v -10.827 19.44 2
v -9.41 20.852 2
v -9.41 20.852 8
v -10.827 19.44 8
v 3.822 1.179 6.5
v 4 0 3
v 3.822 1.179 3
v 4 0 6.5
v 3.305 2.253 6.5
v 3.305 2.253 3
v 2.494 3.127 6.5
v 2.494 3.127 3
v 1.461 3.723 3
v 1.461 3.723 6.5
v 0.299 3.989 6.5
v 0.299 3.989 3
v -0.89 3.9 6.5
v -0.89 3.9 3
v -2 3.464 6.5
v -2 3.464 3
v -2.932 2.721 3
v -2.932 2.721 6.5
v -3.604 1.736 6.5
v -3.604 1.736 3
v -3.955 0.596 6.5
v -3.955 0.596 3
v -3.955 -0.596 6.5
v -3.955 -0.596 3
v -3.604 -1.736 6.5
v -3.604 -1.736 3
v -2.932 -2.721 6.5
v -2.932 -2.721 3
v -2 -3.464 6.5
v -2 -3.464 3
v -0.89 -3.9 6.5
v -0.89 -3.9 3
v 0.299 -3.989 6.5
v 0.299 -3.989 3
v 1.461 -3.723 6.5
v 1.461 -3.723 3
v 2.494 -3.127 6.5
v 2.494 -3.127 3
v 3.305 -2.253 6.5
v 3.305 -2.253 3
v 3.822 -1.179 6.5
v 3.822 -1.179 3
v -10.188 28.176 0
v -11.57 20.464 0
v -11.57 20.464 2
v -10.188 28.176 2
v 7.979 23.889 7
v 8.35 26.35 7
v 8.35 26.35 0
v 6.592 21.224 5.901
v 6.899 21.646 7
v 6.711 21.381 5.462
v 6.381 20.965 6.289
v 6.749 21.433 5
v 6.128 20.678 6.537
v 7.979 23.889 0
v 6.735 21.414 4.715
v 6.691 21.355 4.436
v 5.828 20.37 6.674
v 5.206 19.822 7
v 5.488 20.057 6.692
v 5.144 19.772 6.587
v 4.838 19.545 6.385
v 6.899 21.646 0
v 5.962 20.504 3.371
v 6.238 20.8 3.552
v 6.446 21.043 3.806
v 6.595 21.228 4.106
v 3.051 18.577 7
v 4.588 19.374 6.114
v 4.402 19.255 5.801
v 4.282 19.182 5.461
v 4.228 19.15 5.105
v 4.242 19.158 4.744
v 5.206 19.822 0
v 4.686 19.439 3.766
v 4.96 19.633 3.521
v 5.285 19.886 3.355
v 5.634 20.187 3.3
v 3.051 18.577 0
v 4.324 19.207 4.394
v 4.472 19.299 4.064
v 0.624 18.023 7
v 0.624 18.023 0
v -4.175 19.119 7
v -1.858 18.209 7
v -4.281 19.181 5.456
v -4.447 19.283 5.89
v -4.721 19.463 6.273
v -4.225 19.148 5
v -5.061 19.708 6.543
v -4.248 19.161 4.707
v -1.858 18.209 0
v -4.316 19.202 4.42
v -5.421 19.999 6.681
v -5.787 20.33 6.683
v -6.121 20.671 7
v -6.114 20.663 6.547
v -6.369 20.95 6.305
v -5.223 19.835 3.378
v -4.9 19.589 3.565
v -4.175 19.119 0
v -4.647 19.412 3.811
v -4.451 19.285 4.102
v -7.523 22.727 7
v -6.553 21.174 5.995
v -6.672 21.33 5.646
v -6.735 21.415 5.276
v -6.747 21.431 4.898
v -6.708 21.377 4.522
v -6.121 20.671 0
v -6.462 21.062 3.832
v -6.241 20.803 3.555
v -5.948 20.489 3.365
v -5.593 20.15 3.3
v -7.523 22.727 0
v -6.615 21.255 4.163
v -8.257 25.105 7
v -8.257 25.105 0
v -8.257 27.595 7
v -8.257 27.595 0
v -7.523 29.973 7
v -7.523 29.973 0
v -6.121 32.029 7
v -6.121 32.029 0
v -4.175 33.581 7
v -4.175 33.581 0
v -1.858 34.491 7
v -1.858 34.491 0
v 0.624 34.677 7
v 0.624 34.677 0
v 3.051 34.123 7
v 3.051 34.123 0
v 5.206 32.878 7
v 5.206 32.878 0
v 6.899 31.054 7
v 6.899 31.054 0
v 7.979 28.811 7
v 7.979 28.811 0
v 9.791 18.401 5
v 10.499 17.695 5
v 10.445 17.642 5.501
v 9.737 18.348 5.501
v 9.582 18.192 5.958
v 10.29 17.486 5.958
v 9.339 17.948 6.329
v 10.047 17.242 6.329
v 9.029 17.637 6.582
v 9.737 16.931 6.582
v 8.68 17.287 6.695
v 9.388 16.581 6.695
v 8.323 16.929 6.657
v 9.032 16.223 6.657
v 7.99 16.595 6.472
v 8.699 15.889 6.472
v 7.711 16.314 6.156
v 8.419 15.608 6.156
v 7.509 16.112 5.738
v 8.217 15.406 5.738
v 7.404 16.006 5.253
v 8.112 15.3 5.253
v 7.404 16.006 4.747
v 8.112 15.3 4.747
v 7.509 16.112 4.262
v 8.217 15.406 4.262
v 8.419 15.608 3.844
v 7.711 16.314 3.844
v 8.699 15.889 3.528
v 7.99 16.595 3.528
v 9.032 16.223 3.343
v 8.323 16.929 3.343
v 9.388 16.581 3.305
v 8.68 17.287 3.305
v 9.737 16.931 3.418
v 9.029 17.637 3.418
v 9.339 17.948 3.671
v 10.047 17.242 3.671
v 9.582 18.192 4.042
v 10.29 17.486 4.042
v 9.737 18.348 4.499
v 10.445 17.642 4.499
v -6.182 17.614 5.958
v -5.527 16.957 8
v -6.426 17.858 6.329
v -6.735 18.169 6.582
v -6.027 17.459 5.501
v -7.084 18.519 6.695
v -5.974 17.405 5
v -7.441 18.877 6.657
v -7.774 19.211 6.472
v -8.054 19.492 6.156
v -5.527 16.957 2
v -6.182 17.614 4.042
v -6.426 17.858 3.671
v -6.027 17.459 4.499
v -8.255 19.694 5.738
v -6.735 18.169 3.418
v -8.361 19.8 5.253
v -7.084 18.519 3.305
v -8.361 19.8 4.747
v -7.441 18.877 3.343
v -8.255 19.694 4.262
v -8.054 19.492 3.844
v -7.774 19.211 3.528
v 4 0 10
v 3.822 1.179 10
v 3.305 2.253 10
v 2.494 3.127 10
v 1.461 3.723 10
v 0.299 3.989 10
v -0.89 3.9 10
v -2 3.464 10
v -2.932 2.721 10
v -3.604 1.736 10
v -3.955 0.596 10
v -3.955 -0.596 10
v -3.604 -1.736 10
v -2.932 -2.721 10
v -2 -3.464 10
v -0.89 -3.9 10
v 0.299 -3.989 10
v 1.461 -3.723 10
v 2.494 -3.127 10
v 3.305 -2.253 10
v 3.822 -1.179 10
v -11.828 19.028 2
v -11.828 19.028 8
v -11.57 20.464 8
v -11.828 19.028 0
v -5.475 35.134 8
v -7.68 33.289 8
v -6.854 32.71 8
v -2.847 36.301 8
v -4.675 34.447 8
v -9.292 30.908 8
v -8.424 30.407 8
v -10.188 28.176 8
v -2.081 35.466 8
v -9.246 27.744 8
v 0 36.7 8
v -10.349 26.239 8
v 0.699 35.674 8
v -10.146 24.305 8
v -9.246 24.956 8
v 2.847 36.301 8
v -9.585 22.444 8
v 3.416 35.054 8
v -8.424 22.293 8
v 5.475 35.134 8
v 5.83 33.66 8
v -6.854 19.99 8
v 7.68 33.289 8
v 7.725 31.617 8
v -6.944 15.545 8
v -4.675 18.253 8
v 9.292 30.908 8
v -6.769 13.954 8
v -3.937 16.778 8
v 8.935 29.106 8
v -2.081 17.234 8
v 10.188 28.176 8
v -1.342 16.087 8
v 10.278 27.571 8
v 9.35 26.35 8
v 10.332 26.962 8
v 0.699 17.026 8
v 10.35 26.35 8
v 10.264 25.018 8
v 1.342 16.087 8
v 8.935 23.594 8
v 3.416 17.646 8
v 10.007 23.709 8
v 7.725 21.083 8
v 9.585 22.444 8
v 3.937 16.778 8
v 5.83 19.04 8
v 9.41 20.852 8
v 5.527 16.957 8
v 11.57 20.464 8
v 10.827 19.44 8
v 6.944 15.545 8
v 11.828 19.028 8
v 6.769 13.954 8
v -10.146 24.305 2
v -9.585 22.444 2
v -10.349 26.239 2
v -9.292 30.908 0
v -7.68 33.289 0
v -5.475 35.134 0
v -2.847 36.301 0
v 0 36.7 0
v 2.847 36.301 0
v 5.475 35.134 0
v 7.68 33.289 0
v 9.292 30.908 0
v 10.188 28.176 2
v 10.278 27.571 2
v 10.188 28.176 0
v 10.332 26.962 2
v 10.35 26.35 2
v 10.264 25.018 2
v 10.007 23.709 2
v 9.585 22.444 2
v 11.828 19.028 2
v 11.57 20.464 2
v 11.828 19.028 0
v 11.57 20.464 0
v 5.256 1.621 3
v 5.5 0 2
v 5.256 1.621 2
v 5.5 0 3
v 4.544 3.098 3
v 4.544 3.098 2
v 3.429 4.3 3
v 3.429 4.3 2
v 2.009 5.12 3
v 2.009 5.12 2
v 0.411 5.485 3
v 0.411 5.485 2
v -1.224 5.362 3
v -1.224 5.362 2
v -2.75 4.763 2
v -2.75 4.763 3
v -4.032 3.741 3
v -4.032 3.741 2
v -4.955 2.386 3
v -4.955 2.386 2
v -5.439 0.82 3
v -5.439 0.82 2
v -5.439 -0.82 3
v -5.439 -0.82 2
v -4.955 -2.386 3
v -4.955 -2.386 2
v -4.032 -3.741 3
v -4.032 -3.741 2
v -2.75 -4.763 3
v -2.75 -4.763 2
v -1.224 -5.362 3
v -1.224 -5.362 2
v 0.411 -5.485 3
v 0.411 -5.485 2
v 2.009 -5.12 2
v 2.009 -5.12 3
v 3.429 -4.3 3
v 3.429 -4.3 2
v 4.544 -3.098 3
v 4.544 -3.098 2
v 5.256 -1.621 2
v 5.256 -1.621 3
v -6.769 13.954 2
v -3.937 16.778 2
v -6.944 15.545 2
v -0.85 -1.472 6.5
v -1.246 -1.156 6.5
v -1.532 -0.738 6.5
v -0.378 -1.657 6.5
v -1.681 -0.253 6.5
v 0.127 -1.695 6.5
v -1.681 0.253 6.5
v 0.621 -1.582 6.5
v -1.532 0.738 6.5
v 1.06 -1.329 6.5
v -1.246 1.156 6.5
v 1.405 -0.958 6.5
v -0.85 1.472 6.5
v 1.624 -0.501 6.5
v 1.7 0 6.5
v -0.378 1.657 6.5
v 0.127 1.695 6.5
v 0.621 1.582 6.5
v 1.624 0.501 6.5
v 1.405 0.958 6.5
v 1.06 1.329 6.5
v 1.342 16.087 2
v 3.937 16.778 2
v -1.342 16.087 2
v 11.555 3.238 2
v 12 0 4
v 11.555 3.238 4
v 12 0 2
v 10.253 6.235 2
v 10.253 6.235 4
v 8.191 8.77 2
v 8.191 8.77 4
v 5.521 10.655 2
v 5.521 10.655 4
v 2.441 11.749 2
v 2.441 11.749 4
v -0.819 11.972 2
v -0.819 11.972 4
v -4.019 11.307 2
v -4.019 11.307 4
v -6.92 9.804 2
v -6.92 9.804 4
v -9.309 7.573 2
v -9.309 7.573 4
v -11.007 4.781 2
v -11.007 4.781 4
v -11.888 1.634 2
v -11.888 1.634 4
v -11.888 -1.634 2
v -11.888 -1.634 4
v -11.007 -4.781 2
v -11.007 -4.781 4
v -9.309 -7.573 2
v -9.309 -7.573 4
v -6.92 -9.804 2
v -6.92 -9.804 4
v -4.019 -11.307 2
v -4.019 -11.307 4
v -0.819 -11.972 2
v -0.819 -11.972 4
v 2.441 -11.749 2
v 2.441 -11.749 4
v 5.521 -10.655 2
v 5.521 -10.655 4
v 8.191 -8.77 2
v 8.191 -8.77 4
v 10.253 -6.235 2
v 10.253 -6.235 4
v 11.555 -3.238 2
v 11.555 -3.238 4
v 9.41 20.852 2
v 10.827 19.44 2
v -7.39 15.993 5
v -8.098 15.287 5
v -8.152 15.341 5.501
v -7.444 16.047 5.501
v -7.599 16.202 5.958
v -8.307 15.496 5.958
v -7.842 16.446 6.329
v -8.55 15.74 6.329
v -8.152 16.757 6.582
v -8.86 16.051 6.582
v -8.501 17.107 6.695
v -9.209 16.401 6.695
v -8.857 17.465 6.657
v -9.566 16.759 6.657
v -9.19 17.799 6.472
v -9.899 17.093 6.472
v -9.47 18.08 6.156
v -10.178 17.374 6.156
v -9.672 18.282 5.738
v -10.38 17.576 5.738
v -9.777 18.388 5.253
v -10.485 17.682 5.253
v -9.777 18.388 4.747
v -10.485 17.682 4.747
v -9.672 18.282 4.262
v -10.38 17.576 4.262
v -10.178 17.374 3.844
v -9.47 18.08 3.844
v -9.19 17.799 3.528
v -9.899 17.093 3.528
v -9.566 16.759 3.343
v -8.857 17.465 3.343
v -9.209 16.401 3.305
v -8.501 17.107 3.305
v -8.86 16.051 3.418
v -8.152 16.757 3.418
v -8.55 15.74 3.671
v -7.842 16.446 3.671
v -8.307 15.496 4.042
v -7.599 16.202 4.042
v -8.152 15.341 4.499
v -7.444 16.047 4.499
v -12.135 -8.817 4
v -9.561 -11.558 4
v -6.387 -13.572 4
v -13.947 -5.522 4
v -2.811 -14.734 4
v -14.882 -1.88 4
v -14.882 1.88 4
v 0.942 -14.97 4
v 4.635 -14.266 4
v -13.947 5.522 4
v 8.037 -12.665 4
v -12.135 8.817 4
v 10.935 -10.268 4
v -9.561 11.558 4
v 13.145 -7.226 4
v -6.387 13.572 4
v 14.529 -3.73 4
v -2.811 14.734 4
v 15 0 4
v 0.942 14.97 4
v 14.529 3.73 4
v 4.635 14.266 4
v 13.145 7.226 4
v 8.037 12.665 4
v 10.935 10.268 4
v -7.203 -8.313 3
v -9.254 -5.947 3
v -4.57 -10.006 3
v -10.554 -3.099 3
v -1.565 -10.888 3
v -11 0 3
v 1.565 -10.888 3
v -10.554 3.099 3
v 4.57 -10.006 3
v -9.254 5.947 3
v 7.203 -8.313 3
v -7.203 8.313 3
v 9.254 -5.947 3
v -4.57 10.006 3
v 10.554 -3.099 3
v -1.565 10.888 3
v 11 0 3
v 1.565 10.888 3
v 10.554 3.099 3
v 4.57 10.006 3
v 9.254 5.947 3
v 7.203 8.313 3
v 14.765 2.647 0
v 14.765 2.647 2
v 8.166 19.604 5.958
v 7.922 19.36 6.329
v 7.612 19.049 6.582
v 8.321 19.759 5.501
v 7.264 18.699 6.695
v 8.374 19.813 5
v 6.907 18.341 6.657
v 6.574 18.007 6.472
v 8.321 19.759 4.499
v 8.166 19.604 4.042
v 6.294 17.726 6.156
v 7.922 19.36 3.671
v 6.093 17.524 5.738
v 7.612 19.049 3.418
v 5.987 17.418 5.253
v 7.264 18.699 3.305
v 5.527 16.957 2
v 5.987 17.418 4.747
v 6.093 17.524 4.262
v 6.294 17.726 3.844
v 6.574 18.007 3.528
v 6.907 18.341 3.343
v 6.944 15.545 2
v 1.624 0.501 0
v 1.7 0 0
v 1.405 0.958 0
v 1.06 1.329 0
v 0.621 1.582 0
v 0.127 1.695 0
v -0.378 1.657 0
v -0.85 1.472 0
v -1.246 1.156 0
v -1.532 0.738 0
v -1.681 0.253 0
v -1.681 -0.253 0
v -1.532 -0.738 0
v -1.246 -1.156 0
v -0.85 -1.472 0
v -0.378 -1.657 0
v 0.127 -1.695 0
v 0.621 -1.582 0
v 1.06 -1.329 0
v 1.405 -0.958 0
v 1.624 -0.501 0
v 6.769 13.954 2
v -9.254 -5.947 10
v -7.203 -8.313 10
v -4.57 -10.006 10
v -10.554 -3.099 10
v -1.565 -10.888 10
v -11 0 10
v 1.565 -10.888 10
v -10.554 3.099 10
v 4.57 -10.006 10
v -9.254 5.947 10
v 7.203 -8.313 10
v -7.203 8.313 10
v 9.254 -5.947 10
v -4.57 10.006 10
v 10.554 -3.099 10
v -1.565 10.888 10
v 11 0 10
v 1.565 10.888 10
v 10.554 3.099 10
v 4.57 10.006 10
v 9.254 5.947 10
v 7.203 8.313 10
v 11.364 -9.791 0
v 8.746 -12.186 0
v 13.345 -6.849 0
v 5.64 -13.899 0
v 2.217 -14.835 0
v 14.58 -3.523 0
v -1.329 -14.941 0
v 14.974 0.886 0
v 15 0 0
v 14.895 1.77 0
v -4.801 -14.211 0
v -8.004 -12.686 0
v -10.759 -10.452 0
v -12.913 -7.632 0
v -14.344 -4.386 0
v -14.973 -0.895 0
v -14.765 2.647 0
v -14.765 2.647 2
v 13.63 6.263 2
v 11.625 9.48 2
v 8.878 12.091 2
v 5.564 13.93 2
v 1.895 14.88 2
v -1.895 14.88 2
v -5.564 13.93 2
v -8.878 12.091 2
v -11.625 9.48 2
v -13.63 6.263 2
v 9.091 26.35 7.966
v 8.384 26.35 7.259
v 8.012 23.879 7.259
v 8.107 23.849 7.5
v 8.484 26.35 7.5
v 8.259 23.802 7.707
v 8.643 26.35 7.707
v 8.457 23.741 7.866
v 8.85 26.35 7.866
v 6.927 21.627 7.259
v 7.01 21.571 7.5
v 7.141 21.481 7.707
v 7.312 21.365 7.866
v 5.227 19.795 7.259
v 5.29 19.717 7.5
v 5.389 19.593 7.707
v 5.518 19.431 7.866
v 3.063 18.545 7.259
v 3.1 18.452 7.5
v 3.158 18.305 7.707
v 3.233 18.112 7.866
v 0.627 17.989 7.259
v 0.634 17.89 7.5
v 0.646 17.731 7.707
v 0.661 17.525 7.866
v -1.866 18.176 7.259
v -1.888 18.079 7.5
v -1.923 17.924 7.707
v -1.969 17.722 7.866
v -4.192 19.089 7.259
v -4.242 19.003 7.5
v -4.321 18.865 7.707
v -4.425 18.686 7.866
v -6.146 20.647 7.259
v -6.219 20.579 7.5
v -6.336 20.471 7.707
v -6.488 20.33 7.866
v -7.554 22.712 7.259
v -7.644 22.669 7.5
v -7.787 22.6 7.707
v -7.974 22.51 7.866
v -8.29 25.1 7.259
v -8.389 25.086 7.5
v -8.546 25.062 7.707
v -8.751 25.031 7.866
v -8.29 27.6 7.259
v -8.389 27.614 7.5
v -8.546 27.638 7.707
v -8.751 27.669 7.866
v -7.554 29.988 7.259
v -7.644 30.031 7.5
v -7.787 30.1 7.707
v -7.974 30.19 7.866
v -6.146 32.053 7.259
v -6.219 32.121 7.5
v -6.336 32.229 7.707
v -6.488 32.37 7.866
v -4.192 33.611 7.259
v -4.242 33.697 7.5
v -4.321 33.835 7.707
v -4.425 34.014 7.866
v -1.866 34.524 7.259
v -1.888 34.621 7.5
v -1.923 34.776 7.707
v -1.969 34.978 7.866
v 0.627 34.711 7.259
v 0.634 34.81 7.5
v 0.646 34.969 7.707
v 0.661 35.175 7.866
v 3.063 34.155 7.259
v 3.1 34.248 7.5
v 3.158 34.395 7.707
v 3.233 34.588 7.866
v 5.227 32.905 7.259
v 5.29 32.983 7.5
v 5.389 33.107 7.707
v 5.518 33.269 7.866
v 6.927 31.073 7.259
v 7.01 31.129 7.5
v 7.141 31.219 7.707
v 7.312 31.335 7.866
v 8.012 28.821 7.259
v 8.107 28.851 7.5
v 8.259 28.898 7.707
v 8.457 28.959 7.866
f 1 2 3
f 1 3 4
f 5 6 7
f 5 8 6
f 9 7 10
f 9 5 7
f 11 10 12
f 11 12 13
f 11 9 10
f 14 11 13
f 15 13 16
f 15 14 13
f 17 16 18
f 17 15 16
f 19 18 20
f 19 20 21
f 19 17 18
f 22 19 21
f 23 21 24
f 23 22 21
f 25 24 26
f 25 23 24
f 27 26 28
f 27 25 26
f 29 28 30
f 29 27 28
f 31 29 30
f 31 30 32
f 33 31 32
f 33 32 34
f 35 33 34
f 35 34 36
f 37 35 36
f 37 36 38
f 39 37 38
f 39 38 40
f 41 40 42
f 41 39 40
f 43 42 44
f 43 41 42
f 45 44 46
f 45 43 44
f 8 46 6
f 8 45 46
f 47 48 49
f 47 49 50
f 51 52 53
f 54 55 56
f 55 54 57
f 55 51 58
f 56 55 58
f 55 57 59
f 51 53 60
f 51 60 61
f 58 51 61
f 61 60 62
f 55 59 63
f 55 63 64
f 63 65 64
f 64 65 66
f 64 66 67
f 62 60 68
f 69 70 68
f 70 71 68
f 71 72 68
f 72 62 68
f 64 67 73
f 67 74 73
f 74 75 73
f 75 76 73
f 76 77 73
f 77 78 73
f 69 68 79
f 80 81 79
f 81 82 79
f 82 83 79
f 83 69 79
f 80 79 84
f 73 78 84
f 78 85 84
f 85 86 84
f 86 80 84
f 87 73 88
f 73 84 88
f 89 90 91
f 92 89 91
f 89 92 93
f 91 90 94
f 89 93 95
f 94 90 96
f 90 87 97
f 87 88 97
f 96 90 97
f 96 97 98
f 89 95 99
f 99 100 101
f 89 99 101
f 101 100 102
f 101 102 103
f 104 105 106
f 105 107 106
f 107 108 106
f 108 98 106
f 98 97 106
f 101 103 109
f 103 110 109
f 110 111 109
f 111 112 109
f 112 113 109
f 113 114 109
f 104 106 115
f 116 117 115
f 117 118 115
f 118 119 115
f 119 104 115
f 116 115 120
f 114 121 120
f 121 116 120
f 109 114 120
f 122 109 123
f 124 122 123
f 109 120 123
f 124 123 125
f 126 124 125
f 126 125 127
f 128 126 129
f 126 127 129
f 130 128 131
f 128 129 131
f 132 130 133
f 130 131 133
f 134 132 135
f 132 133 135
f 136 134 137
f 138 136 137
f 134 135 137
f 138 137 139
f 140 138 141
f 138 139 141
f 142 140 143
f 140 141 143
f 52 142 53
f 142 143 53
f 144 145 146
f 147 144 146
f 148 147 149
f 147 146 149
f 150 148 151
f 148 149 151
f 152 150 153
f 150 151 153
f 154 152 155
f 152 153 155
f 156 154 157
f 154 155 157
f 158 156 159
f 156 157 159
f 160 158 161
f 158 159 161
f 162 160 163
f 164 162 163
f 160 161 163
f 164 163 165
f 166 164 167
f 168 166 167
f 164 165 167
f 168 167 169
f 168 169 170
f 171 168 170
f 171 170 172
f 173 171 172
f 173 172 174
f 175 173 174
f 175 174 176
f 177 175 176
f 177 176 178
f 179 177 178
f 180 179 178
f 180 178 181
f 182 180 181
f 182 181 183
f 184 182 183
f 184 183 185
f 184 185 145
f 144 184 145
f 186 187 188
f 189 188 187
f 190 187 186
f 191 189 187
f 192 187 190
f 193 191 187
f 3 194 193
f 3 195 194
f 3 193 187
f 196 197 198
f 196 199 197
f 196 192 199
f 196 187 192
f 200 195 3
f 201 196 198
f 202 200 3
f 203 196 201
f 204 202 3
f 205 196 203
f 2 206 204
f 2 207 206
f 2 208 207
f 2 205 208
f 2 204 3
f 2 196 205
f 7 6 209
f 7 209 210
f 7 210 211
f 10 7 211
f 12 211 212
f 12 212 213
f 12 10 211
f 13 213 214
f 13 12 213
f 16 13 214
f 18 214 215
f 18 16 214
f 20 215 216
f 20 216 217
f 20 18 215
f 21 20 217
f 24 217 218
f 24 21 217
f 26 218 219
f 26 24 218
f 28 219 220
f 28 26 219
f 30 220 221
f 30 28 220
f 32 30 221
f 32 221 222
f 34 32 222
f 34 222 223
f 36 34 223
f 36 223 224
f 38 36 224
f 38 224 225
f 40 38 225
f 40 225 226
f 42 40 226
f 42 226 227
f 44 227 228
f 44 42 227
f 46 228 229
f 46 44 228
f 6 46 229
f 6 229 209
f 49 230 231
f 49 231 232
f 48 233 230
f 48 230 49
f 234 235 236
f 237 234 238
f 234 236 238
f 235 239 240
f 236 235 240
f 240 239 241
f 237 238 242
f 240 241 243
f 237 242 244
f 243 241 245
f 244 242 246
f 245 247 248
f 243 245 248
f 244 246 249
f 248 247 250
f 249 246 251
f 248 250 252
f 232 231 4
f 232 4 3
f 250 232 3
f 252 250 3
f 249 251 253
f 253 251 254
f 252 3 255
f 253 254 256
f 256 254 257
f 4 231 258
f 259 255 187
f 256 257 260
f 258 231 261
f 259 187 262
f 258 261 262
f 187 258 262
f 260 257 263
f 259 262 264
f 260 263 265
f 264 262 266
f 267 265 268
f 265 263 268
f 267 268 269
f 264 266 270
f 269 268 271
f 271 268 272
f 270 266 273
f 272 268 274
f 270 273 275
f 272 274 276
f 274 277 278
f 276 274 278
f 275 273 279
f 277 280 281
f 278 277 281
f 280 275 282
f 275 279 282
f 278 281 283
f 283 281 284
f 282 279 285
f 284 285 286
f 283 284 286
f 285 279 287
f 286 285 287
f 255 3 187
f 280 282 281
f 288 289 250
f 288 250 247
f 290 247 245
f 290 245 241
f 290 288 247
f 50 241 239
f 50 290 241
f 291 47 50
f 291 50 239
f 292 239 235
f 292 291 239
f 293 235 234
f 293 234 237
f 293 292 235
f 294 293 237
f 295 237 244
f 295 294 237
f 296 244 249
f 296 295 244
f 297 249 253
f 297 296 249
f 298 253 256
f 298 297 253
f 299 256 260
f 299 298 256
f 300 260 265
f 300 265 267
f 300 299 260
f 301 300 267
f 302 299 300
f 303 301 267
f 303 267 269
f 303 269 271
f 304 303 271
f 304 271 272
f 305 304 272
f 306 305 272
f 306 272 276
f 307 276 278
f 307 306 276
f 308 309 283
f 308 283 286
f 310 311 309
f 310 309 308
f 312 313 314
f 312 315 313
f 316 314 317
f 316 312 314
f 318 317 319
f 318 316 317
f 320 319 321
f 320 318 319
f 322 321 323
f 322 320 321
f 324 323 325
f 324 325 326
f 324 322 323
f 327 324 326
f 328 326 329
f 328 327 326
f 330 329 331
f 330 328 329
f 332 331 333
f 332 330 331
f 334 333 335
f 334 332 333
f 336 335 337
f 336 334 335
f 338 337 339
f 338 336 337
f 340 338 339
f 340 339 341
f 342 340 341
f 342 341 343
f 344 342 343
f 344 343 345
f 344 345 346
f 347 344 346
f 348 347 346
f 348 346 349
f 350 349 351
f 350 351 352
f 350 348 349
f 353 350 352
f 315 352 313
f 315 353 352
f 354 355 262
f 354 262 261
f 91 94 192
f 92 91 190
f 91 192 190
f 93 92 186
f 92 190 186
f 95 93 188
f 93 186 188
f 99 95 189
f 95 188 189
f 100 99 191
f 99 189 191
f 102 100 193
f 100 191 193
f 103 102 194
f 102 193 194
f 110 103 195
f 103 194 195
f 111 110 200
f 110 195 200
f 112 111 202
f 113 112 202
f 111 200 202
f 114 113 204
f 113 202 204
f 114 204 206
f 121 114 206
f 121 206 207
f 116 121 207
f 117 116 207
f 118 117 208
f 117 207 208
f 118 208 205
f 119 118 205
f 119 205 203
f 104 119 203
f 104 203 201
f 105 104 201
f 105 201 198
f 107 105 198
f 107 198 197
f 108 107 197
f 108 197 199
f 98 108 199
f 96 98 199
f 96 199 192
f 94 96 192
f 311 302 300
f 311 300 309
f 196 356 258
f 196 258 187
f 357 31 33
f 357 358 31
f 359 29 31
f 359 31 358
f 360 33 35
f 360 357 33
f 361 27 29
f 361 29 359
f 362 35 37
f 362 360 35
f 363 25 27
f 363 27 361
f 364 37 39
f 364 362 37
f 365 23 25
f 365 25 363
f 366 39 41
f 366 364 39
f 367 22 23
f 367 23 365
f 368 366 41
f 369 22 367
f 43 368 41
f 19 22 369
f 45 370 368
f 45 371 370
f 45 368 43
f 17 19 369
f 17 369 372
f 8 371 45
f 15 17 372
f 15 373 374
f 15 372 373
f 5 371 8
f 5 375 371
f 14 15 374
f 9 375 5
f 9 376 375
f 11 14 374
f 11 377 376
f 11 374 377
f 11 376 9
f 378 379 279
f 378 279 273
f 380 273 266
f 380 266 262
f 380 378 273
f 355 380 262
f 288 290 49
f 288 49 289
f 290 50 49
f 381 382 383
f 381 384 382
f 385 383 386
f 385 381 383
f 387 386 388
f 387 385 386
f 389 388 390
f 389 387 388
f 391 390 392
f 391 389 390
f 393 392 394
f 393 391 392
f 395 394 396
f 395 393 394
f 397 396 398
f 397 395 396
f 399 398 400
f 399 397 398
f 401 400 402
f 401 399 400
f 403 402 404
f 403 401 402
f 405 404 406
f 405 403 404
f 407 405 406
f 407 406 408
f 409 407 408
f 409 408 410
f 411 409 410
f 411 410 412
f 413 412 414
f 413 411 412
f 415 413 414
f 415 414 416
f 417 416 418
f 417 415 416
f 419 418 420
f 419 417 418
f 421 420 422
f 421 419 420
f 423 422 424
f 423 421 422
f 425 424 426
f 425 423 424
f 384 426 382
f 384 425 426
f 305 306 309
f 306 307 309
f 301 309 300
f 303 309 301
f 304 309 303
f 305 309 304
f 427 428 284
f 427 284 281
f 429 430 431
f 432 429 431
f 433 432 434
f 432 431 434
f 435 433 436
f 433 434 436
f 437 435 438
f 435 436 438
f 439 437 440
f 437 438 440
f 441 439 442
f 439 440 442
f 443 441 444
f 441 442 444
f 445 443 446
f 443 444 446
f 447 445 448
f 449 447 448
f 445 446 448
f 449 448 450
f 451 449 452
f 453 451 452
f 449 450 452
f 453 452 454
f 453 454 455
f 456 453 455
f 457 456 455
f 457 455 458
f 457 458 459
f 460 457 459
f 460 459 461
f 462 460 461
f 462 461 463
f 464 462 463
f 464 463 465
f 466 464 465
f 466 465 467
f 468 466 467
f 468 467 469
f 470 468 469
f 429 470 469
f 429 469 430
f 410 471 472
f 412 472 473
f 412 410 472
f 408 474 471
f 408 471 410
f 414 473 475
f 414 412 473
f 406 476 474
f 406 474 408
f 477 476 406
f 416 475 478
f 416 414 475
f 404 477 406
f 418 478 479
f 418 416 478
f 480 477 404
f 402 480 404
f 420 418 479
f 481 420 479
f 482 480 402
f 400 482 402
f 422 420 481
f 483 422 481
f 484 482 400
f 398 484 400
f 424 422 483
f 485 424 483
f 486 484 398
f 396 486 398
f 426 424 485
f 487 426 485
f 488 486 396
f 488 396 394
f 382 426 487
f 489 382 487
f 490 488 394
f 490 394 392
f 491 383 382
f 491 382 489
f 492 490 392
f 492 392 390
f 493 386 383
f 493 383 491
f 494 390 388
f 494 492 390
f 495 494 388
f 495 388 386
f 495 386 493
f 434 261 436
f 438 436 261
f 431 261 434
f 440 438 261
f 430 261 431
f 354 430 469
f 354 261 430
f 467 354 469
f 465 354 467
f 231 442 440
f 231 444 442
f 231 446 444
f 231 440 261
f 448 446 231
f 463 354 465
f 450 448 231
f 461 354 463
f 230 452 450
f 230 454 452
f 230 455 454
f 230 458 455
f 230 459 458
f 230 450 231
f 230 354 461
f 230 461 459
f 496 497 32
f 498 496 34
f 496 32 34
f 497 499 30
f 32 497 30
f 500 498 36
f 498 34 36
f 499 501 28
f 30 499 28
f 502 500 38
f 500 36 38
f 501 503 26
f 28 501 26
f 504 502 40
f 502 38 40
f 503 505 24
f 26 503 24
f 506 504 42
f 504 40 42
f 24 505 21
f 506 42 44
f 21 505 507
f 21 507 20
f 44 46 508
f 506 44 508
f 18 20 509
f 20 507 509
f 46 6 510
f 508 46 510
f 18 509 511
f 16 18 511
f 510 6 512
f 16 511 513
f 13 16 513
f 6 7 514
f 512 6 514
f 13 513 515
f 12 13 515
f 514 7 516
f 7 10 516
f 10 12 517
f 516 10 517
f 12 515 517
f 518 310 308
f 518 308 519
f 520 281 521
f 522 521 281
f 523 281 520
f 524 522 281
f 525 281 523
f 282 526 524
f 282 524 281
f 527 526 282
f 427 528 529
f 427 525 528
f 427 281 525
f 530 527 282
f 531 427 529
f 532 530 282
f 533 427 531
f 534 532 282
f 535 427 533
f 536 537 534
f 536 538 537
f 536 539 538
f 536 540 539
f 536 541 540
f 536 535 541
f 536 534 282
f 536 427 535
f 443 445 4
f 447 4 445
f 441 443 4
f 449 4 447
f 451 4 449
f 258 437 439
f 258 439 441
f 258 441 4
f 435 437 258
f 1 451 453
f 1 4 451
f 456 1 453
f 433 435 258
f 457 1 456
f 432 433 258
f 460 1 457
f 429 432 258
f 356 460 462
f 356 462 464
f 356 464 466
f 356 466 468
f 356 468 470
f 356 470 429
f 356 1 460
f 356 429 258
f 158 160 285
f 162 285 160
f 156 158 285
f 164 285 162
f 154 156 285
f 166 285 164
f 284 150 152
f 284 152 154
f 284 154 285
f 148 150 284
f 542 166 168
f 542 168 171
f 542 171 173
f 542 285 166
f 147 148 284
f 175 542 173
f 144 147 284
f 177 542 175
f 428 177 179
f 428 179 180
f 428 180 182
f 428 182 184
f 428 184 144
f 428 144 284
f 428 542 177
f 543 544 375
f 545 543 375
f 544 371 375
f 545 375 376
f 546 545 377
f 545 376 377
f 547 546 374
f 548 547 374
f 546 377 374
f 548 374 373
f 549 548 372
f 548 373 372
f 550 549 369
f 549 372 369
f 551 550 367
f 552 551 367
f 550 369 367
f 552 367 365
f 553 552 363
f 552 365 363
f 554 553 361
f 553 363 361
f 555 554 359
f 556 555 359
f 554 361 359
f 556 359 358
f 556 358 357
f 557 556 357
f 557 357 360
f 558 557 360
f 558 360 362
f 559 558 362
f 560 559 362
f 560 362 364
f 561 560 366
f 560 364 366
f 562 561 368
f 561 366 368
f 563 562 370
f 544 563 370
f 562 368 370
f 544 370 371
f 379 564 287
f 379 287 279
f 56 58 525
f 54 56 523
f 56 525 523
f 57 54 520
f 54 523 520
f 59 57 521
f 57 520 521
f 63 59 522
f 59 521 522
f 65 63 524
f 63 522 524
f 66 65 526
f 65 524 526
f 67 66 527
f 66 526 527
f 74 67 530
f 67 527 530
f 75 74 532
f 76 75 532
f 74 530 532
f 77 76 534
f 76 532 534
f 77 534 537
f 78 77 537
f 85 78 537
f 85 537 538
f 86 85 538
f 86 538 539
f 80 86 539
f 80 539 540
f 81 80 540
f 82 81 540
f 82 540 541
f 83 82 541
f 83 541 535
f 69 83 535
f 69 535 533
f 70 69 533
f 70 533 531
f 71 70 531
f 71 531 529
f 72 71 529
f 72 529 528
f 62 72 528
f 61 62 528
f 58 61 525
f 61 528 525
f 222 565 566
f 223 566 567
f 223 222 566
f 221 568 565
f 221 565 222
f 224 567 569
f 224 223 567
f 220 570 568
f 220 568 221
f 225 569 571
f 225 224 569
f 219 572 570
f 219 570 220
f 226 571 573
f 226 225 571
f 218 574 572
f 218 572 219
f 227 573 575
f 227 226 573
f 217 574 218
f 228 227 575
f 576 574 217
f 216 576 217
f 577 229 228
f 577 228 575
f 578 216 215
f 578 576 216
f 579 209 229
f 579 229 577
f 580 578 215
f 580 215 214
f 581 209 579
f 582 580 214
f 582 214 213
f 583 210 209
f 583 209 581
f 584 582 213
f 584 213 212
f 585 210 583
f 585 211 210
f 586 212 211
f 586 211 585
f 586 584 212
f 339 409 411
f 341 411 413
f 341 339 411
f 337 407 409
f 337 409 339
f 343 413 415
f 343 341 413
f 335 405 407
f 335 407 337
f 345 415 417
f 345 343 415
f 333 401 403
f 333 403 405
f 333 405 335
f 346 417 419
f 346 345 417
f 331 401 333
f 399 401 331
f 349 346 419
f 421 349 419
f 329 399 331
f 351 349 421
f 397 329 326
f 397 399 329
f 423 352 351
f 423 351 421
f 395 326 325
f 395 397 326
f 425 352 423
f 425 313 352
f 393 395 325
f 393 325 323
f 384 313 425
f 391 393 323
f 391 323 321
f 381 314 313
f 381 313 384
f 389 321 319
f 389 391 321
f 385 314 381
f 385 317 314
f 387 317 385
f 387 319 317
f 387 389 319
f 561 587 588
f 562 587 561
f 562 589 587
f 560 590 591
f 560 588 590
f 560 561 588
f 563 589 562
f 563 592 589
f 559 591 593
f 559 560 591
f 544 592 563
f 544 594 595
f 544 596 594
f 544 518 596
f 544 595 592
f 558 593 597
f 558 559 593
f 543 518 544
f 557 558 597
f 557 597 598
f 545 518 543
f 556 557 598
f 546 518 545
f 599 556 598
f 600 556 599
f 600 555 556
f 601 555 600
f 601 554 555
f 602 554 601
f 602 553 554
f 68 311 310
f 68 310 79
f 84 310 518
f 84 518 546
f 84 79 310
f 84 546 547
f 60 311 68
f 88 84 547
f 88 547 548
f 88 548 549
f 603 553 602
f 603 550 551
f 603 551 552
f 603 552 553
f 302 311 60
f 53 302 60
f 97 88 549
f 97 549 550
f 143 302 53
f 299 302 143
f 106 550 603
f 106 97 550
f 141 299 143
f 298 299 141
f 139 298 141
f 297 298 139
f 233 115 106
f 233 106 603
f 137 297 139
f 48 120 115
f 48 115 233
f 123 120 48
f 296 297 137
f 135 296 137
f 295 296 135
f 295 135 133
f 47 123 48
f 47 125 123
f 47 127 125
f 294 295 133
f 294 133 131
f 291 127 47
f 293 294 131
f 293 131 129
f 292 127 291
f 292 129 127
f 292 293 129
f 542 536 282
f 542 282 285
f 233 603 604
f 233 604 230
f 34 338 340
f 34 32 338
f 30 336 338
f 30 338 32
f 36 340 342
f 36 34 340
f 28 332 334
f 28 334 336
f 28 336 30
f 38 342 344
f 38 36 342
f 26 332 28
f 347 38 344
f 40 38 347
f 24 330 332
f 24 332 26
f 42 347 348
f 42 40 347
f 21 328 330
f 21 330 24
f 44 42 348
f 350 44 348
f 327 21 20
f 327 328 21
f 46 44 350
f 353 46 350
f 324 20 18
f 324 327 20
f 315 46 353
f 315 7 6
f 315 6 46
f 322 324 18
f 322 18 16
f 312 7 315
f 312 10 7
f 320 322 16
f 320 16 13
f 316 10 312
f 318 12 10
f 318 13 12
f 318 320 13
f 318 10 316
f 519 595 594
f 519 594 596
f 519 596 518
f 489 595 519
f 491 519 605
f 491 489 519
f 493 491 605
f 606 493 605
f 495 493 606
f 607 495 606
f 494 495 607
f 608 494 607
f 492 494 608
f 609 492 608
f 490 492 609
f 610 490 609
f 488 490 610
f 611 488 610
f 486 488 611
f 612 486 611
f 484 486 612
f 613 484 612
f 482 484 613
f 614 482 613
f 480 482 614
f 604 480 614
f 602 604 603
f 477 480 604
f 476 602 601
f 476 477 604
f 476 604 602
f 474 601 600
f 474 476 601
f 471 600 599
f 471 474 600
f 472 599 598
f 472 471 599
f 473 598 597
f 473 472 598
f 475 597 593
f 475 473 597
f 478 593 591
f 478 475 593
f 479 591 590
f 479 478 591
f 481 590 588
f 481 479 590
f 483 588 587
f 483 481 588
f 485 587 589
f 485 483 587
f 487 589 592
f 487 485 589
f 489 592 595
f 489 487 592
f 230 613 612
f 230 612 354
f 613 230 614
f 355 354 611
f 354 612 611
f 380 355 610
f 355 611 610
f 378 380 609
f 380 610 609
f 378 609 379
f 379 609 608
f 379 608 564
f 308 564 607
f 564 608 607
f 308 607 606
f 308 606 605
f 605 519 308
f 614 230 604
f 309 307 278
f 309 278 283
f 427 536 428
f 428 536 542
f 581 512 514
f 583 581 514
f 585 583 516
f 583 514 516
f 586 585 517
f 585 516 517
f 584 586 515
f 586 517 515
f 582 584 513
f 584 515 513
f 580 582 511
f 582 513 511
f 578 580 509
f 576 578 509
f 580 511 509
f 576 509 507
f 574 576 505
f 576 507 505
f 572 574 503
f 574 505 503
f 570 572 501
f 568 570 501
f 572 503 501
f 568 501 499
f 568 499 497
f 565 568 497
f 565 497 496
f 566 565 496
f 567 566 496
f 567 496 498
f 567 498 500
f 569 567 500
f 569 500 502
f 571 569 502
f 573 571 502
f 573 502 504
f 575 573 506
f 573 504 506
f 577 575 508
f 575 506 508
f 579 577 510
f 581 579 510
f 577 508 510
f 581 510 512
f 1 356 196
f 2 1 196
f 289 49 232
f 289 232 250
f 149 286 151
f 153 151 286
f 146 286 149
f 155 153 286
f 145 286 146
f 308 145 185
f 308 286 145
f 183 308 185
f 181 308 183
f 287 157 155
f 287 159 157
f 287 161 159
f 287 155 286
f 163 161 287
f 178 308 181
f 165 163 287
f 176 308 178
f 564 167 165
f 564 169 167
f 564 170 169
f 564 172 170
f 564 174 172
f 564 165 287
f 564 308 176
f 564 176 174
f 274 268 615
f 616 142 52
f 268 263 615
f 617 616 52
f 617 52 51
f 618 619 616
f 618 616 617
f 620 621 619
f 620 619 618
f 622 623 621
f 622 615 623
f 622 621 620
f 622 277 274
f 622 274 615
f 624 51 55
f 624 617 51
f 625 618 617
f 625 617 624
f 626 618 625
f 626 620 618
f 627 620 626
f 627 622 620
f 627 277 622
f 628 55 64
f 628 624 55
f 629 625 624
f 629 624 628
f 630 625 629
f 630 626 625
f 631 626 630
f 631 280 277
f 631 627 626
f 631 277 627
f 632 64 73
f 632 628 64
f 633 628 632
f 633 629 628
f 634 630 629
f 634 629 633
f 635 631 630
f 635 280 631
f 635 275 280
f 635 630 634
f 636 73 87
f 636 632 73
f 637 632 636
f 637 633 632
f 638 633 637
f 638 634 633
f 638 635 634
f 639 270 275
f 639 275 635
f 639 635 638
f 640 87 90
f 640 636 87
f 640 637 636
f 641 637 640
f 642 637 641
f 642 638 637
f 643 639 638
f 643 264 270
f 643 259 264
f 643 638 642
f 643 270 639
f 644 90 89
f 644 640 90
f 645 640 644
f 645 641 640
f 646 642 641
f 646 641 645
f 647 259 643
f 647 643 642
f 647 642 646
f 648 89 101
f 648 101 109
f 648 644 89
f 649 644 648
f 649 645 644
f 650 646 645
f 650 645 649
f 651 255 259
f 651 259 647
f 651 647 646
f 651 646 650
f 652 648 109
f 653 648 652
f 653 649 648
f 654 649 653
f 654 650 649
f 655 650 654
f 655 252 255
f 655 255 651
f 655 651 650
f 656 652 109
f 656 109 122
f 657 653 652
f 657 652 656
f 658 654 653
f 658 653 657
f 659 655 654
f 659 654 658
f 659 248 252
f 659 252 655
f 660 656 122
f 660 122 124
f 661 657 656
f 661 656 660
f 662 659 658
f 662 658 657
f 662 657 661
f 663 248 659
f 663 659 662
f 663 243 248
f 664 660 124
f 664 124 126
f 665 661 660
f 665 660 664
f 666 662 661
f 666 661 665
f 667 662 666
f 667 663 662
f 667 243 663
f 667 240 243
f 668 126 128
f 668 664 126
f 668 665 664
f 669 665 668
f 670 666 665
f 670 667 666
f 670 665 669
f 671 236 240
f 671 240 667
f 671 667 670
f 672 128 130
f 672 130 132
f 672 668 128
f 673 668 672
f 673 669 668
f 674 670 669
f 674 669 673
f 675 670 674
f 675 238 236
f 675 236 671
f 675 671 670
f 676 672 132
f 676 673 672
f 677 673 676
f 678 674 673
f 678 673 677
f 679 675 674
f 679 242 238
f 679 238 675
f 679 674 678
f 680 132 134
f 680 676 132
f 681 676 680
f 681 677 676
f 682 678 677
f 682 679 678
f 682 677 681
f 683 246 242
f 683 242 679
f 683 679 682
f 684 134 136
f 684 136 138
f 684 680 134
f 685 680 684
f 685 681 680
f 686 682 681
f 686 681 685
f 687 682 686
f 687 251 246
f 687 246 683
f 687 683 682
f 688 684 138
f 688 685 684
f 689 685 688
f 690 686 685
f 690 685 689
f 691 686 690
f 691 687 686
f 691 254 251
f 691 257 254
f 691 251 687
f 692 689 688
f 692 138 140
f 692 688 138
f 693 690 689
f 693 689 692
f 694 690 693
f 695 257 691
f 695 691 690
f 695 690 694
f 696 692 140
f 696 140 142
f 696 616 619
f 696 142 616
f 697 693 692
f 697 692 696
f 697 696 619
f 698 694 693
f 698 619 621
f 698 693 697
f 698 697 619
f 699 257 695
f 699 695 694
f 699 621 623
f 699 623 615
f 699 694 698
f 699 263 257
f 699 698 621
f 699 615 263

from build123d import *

# Parameters (mm, degrees)
F3_R         = 1.7
F4_DEPTH     = 6.5
F5_R         = 8.35
F5_R_2       = 1.7
F2_FACE1_R   = 15
F2_FACE1_R_2 = 1.7
F6_DEPTH     = 2
F7_DEPTH     = 8
F8_R         = 1.7
F9_DEPTH     = 6.4687966713
F10_R        = 1.7
F11_DEPTH    = 6.4687966703
F12_R        = 11
F12_R_2      = 4
F13_DEPTH    = 7
F14_R        = 1


with BuildPart() as f2:
    # F1 (on Front) → F2 (revolve)
    with BuildSketch(Plane.XZ):
        Polygon((0, 6.5), (0, 0), (15, 0), (15, 4), (12, 4), (12, 2), (11, 2), (5.5, 2), (5.5, 3), (4, 3), (4, 6.5), align=None)
    revolve(axis=Axis((0, 0, 3.25), (0, 0, 1)))

    # F3 (on face) → F4 (cut, through all)
    with BuildSketch(Plane.XY.offset(6.5)):
        Circle(F3_R)
    extrude(amount=-F4_DEPTH, mode=Mode.SUBTRACT)

    # F5 (on face) + F2_face1 (on face) → F6 (join, through all)
    with BuildSketch(Plane(origin=(0, 0, 0), x_dir=(1, 0, 0), z_dir=(0, 0, -1))):
        with BuildLine():
            ThreePointArc((14.7645887035, -2.6470588235), (0, -15), (-14.7645887035, -2.6470588235))
            Line((-14.7645887035, -2.6470588235), (-11.8277186488, -19.0281373429))
            Line((-11.8277186488, -19.0281373429), (-6.769480635, -13.9539071991))
            Line((-6.769480635, -13.9539071991), (-3.9365929167, -16.7778666846))
            ThreePointArc((-3.9365929167, -16.7778666846), (0, -16), (3.9365929167, -16.7778666846))
            Line((3.9365929167, -16.7778666846), (6.769480635, -13.9539071991))
            Line((6.769480635, -13.9539071991), (11.8277186488, -19.0281373429))
            Line((11.8277186488, -19.0281373429), (14.7645887035, -2.6470588235))
        make_face()
        with BuildLine():
            Line((11.5702645211, -20.4641478586), (11.8277186488, -19.0281373429))
            Line((11.8277186488, -19.0281373429), (6.769480635, -13.9539071991))
            Line((6.769480635, -13.9539071991), (3.9365929167, -16.7778666846))
            ThreePointArc((3.9365929167, -16.7778666846), (7.3300969712, -19.0430048314), (9.5845118876, -22.4436421212))
            Line((9.5845118876, -22.4436421212), (11.5702645211, -20.4641478586))
        make_face()
        Polygon((9.4102464779, -20.8523748379), (5.5273021855, -16.9571542252), (6.9437460446, -15.5451744825), (10.8266903371, -19.4403950952), align=None, mode=Mode.SUBTRACT)
        with BuildLine():
            Line((10.1875662054, -28.1764705882), (11.5702645211, -20.4641478586))
            Line((11.5702645211, -20.4641478586), (9.5845118876, -22.4436421212))
            ThreePointArc((9.5845118876, -22.4436421212), (10.1568252431, -24.359673147), (10.35, -26.35))
            ThreePointArc((10.35, -26.35), (10.3093115732, -27.2668396189), (10.1875662054, -28.1764705882))
        make_face()
        with BuildLine():
            ThreePointArc((-9.5845118876, -22.4436421212), (-10.2932064289, -25.2672251329), (-10.1875662054, -28.1764705882))
            ThreePointArc((-10.1875662054, -28.1764705882), (0, -36.7), (10.1875662054, -28.1764705882))
            ThreePointArc((10.1875662054, -28.1764705882), (10.3093115732, -27.2668396189), (10.35, -26.35))
            ThreePointArc((10.35, -26.35), (10.1568252431, -24.359673147), (9.5845118876, -22.4436421212))
            ThreePointArc((9.5845118876, -22.4436421212), (7.3300969712, -19.0430048314), (3.9365929167, -16.7778666846))
            ThreePointArc((3.9365929167, -16.7778666846), (0, -16), (-3.9365929167, -16.7778666846))
            ThreePointArc((-3.9365929167, -16.7778666846), (-7.3300969712, -19.0430048314), (-9.5845118876, -22.4436421212))
        make_face()
        with Locations((0, -26.35)):
            Circle(F5_R, mode=Mode.SUBTRACT)
        with BuildLine():
            Line((-6.769480635, -13.9539071991), (-11.8277186488, -19.0281373429))
            Line((-11.8277186488, -19.0281373429), (-11.5702645211, -20.4641478586))
            Line((-11.5702645211, -20.4641478586), (-9.5845118876, -22.4436421212))
            ThreePointArc((-9.5845118876, -22.4436421212), (-7.3300969712, -19.0430048314), (-3.9365929167, -16.7778666846))
            Line((-3.9365929167, -16.7778666846), (-6.769480635, -13.9539071991))
        make_face()
        Polygon((-5.5273021855, -16.9571542252), (-9.4102464779, -20.8523748379), (-10.8266903371, -19.4403950952), (-6.9437460446, -15.5451744825), align=None, mode=Mode.SUBTRACT)
        Polygon((-10.8266903371, -19.4403950952), (-9.4102464779, -20.8523748379), (-5.5273021855, -16.9571542252), (-6.9437460446, -15.5451744825), align=None)
        with BuildLine():
            Line((-9.5845118876, -22.4436421212), (-11.5702645211, -20.4641478586))
            Line((-11.5702645211, -20.4641478586), (-10.1875662054, -28.1764705882))
            ThreePointArc((-10.1875662054, -28.1764705882), (-10.2932064289, -25.2672251329), (-9.5845118876, -22.4436421212))
        make_face()
        with BuildLine():
            ThreePointArc((14.7645887035, -2.6470588235), (14.9410312655, -1.3287530709), (15, 0))
            ThreePointArc((15, 0), (-1.3287530709, 14.9410312655), (-14.7645887035, -2.6470588235))
            ThreePointArc((-14.7645887035, -2.6470588235), (0, -15), (14.7645887035, -2.6470588235))
        make_face()
        Circle(F5_R_2, mode=Mode.SUBTRACT)
        Polygon((6.9437460446, -15.5451744825), (5.5273021855, -16.9571542252), (9.4102464779, -20.8523748379), (10.8266903371, -19.4403950952), align=None)
    with BuildSketch(Plane(origin=(0, 0, 0), x_dir=(1, 0, 0), z_dir=(0, 0, -1))):
        Circle(F2_FACE1_R)
        Circle(F2_FACE1_R_2, mode=Mode.SUBTRACT)
    extrude(amount=-F6_DEPTH)

    # F5 (on face) → F7 (join)
    with BuildSketch(Plane(origin=(0, 0, 0), x_dir=(1, 0, 0), z_dir=(0, 0, -1))):
        with BuildLine():
            ThreePointArc((-9.5845118876, -22.4436421212), (-10.2932064289, -25.2672251329), (-10.1875662054, -28.1764705882))
            ThreePointArc((-10.1875662054, -28.1764705882), (0, -36.7), (10.1875662054, -28.1764705882))
            ThreePointArc((10.1875662054, -28.1764705882), (10.3093115732, -27.2668396189), (10.35, -26.35))
            ThreePointArc((10.35, -26.35), (10.1568252431, -24.359673147), (9.5845118876, -22.4436421212))
            ThreePointArc((9.5845118876, -22.4436421212), (7.3300969712, -19.0430048314), (3.9365929167, -16.7778666846))
            ThreePointArc((3.9365929167, -16.7778666846), (0, -16), (-3.9365929167, -16.7778666846))
            ThreePointArc((-3.9365929167, -16.7778666846), (-7.3300969712, -19.0430048314), (-9.5845118876, -22.4436421212))
        make_face()
        with Locations((0, -26.35)):
            Circle(F5_R, mode=Mode.SUBTRACT)
        with BuildLine():
            Line((-6.769480635, -13.9539071991), (-11.8277186488, -19.0281373429))
            Line((-11.8277186488, -19.0281373429), (-11.5702645211, -20.4641478586))
            Line((-11.5702645211, -20.4641478586), (-9.5845118876, -22.4436421212))
            ThreePointArc((-9.5845118876, -22.4436421212), (-7.3300969712, -19.0430048314), (-3.9365929167, -16.7778666846))
            Line((-3.9365929167, -16.7778666846), (-6.769480635, -13.9539071991))
        make_face()
        Polygon((-5.5273021855, -16.9571542252), (-9.4102464779, -20.8523748379), (-10.8266903371, -19.4403950952), (-6.9437460446, -15.5451744825), align=None, mode=Mode.SUBTRACT)
        with BuildLine():
            Line((11.5702645211, -20.4641478586), (11.8277186488, -19.0281373429))
            Line((11.8277186488, -19.0281373429), (6.769480635, -13.9539071991))
            Line((6.769480635, -13.9539071991), (3.9365929167, -16.7778666846))
            ThreePointArc((3.9365929167, -16.7778666846), (7.3300969712, -19.0430048314), (9.5845118876, -22.4436421212))
            Line((9.5845118876, -22.4436421212), (11.5702645211, -20.4641478586))
        make_face()
        Polygon((9.4102464779, -20.8523748379), (5.5273021855, -16.9571542252), (6.9437460446, -15.5451744825), (10.8266903371, -19.4403950952), align=None, mode=Mode.SUBTRACT)
    extrude(amount=-F7_DEPTH)

    # F8 (on face) → F9 (cut, up to face)
    with BuildSketch(Plane(origin=(3.5814942406, 3.5702066719, 0), x_dir=(0.7059898714, -0.7082219296, 0), z_dir=(-0.7082219296, -0.7059898714, 0))):
        with Locations((-18.2440207785, 5)):
            Circle(F8_R)
    extrude(amount=-F9_DEPTH, mode=Mode.SUBTRACT)

    # F10 (on face) → F11 (cut, up to face)
    with BuildSketch(Plane(origin=(-3.5814942406, 3.5702066719, 0), x_dir=(0.7059898714, 0.7082219296, 0), z_dir=(0.7082219296, -0.7059898714, 0))):
        with Locations((18.2440207785, 5)):
            Circle(F10_R)
    extrude(amount=-F11_DEPTH, mode=Mode.SUBTRACT)

    # F14
    f14_edges = [f2.edges().sort_by_distance(p)[0] for p in [
        (-8.35, 26.35, 8),
    ]]
    fillet(f14_edges, radius=F14_R)


with BuildPart() as f13:
    # F12 (on face) → F13 (new body)
    with BuildSketch(Plane.XY.offset(3)):
        Circle(F12_R)
        Circle(F12_R_2, mode=Mode.SUBTRACT)
    extrude(amount=F13_DEPTH)


solid = Compound([f2.part, f13.part])
